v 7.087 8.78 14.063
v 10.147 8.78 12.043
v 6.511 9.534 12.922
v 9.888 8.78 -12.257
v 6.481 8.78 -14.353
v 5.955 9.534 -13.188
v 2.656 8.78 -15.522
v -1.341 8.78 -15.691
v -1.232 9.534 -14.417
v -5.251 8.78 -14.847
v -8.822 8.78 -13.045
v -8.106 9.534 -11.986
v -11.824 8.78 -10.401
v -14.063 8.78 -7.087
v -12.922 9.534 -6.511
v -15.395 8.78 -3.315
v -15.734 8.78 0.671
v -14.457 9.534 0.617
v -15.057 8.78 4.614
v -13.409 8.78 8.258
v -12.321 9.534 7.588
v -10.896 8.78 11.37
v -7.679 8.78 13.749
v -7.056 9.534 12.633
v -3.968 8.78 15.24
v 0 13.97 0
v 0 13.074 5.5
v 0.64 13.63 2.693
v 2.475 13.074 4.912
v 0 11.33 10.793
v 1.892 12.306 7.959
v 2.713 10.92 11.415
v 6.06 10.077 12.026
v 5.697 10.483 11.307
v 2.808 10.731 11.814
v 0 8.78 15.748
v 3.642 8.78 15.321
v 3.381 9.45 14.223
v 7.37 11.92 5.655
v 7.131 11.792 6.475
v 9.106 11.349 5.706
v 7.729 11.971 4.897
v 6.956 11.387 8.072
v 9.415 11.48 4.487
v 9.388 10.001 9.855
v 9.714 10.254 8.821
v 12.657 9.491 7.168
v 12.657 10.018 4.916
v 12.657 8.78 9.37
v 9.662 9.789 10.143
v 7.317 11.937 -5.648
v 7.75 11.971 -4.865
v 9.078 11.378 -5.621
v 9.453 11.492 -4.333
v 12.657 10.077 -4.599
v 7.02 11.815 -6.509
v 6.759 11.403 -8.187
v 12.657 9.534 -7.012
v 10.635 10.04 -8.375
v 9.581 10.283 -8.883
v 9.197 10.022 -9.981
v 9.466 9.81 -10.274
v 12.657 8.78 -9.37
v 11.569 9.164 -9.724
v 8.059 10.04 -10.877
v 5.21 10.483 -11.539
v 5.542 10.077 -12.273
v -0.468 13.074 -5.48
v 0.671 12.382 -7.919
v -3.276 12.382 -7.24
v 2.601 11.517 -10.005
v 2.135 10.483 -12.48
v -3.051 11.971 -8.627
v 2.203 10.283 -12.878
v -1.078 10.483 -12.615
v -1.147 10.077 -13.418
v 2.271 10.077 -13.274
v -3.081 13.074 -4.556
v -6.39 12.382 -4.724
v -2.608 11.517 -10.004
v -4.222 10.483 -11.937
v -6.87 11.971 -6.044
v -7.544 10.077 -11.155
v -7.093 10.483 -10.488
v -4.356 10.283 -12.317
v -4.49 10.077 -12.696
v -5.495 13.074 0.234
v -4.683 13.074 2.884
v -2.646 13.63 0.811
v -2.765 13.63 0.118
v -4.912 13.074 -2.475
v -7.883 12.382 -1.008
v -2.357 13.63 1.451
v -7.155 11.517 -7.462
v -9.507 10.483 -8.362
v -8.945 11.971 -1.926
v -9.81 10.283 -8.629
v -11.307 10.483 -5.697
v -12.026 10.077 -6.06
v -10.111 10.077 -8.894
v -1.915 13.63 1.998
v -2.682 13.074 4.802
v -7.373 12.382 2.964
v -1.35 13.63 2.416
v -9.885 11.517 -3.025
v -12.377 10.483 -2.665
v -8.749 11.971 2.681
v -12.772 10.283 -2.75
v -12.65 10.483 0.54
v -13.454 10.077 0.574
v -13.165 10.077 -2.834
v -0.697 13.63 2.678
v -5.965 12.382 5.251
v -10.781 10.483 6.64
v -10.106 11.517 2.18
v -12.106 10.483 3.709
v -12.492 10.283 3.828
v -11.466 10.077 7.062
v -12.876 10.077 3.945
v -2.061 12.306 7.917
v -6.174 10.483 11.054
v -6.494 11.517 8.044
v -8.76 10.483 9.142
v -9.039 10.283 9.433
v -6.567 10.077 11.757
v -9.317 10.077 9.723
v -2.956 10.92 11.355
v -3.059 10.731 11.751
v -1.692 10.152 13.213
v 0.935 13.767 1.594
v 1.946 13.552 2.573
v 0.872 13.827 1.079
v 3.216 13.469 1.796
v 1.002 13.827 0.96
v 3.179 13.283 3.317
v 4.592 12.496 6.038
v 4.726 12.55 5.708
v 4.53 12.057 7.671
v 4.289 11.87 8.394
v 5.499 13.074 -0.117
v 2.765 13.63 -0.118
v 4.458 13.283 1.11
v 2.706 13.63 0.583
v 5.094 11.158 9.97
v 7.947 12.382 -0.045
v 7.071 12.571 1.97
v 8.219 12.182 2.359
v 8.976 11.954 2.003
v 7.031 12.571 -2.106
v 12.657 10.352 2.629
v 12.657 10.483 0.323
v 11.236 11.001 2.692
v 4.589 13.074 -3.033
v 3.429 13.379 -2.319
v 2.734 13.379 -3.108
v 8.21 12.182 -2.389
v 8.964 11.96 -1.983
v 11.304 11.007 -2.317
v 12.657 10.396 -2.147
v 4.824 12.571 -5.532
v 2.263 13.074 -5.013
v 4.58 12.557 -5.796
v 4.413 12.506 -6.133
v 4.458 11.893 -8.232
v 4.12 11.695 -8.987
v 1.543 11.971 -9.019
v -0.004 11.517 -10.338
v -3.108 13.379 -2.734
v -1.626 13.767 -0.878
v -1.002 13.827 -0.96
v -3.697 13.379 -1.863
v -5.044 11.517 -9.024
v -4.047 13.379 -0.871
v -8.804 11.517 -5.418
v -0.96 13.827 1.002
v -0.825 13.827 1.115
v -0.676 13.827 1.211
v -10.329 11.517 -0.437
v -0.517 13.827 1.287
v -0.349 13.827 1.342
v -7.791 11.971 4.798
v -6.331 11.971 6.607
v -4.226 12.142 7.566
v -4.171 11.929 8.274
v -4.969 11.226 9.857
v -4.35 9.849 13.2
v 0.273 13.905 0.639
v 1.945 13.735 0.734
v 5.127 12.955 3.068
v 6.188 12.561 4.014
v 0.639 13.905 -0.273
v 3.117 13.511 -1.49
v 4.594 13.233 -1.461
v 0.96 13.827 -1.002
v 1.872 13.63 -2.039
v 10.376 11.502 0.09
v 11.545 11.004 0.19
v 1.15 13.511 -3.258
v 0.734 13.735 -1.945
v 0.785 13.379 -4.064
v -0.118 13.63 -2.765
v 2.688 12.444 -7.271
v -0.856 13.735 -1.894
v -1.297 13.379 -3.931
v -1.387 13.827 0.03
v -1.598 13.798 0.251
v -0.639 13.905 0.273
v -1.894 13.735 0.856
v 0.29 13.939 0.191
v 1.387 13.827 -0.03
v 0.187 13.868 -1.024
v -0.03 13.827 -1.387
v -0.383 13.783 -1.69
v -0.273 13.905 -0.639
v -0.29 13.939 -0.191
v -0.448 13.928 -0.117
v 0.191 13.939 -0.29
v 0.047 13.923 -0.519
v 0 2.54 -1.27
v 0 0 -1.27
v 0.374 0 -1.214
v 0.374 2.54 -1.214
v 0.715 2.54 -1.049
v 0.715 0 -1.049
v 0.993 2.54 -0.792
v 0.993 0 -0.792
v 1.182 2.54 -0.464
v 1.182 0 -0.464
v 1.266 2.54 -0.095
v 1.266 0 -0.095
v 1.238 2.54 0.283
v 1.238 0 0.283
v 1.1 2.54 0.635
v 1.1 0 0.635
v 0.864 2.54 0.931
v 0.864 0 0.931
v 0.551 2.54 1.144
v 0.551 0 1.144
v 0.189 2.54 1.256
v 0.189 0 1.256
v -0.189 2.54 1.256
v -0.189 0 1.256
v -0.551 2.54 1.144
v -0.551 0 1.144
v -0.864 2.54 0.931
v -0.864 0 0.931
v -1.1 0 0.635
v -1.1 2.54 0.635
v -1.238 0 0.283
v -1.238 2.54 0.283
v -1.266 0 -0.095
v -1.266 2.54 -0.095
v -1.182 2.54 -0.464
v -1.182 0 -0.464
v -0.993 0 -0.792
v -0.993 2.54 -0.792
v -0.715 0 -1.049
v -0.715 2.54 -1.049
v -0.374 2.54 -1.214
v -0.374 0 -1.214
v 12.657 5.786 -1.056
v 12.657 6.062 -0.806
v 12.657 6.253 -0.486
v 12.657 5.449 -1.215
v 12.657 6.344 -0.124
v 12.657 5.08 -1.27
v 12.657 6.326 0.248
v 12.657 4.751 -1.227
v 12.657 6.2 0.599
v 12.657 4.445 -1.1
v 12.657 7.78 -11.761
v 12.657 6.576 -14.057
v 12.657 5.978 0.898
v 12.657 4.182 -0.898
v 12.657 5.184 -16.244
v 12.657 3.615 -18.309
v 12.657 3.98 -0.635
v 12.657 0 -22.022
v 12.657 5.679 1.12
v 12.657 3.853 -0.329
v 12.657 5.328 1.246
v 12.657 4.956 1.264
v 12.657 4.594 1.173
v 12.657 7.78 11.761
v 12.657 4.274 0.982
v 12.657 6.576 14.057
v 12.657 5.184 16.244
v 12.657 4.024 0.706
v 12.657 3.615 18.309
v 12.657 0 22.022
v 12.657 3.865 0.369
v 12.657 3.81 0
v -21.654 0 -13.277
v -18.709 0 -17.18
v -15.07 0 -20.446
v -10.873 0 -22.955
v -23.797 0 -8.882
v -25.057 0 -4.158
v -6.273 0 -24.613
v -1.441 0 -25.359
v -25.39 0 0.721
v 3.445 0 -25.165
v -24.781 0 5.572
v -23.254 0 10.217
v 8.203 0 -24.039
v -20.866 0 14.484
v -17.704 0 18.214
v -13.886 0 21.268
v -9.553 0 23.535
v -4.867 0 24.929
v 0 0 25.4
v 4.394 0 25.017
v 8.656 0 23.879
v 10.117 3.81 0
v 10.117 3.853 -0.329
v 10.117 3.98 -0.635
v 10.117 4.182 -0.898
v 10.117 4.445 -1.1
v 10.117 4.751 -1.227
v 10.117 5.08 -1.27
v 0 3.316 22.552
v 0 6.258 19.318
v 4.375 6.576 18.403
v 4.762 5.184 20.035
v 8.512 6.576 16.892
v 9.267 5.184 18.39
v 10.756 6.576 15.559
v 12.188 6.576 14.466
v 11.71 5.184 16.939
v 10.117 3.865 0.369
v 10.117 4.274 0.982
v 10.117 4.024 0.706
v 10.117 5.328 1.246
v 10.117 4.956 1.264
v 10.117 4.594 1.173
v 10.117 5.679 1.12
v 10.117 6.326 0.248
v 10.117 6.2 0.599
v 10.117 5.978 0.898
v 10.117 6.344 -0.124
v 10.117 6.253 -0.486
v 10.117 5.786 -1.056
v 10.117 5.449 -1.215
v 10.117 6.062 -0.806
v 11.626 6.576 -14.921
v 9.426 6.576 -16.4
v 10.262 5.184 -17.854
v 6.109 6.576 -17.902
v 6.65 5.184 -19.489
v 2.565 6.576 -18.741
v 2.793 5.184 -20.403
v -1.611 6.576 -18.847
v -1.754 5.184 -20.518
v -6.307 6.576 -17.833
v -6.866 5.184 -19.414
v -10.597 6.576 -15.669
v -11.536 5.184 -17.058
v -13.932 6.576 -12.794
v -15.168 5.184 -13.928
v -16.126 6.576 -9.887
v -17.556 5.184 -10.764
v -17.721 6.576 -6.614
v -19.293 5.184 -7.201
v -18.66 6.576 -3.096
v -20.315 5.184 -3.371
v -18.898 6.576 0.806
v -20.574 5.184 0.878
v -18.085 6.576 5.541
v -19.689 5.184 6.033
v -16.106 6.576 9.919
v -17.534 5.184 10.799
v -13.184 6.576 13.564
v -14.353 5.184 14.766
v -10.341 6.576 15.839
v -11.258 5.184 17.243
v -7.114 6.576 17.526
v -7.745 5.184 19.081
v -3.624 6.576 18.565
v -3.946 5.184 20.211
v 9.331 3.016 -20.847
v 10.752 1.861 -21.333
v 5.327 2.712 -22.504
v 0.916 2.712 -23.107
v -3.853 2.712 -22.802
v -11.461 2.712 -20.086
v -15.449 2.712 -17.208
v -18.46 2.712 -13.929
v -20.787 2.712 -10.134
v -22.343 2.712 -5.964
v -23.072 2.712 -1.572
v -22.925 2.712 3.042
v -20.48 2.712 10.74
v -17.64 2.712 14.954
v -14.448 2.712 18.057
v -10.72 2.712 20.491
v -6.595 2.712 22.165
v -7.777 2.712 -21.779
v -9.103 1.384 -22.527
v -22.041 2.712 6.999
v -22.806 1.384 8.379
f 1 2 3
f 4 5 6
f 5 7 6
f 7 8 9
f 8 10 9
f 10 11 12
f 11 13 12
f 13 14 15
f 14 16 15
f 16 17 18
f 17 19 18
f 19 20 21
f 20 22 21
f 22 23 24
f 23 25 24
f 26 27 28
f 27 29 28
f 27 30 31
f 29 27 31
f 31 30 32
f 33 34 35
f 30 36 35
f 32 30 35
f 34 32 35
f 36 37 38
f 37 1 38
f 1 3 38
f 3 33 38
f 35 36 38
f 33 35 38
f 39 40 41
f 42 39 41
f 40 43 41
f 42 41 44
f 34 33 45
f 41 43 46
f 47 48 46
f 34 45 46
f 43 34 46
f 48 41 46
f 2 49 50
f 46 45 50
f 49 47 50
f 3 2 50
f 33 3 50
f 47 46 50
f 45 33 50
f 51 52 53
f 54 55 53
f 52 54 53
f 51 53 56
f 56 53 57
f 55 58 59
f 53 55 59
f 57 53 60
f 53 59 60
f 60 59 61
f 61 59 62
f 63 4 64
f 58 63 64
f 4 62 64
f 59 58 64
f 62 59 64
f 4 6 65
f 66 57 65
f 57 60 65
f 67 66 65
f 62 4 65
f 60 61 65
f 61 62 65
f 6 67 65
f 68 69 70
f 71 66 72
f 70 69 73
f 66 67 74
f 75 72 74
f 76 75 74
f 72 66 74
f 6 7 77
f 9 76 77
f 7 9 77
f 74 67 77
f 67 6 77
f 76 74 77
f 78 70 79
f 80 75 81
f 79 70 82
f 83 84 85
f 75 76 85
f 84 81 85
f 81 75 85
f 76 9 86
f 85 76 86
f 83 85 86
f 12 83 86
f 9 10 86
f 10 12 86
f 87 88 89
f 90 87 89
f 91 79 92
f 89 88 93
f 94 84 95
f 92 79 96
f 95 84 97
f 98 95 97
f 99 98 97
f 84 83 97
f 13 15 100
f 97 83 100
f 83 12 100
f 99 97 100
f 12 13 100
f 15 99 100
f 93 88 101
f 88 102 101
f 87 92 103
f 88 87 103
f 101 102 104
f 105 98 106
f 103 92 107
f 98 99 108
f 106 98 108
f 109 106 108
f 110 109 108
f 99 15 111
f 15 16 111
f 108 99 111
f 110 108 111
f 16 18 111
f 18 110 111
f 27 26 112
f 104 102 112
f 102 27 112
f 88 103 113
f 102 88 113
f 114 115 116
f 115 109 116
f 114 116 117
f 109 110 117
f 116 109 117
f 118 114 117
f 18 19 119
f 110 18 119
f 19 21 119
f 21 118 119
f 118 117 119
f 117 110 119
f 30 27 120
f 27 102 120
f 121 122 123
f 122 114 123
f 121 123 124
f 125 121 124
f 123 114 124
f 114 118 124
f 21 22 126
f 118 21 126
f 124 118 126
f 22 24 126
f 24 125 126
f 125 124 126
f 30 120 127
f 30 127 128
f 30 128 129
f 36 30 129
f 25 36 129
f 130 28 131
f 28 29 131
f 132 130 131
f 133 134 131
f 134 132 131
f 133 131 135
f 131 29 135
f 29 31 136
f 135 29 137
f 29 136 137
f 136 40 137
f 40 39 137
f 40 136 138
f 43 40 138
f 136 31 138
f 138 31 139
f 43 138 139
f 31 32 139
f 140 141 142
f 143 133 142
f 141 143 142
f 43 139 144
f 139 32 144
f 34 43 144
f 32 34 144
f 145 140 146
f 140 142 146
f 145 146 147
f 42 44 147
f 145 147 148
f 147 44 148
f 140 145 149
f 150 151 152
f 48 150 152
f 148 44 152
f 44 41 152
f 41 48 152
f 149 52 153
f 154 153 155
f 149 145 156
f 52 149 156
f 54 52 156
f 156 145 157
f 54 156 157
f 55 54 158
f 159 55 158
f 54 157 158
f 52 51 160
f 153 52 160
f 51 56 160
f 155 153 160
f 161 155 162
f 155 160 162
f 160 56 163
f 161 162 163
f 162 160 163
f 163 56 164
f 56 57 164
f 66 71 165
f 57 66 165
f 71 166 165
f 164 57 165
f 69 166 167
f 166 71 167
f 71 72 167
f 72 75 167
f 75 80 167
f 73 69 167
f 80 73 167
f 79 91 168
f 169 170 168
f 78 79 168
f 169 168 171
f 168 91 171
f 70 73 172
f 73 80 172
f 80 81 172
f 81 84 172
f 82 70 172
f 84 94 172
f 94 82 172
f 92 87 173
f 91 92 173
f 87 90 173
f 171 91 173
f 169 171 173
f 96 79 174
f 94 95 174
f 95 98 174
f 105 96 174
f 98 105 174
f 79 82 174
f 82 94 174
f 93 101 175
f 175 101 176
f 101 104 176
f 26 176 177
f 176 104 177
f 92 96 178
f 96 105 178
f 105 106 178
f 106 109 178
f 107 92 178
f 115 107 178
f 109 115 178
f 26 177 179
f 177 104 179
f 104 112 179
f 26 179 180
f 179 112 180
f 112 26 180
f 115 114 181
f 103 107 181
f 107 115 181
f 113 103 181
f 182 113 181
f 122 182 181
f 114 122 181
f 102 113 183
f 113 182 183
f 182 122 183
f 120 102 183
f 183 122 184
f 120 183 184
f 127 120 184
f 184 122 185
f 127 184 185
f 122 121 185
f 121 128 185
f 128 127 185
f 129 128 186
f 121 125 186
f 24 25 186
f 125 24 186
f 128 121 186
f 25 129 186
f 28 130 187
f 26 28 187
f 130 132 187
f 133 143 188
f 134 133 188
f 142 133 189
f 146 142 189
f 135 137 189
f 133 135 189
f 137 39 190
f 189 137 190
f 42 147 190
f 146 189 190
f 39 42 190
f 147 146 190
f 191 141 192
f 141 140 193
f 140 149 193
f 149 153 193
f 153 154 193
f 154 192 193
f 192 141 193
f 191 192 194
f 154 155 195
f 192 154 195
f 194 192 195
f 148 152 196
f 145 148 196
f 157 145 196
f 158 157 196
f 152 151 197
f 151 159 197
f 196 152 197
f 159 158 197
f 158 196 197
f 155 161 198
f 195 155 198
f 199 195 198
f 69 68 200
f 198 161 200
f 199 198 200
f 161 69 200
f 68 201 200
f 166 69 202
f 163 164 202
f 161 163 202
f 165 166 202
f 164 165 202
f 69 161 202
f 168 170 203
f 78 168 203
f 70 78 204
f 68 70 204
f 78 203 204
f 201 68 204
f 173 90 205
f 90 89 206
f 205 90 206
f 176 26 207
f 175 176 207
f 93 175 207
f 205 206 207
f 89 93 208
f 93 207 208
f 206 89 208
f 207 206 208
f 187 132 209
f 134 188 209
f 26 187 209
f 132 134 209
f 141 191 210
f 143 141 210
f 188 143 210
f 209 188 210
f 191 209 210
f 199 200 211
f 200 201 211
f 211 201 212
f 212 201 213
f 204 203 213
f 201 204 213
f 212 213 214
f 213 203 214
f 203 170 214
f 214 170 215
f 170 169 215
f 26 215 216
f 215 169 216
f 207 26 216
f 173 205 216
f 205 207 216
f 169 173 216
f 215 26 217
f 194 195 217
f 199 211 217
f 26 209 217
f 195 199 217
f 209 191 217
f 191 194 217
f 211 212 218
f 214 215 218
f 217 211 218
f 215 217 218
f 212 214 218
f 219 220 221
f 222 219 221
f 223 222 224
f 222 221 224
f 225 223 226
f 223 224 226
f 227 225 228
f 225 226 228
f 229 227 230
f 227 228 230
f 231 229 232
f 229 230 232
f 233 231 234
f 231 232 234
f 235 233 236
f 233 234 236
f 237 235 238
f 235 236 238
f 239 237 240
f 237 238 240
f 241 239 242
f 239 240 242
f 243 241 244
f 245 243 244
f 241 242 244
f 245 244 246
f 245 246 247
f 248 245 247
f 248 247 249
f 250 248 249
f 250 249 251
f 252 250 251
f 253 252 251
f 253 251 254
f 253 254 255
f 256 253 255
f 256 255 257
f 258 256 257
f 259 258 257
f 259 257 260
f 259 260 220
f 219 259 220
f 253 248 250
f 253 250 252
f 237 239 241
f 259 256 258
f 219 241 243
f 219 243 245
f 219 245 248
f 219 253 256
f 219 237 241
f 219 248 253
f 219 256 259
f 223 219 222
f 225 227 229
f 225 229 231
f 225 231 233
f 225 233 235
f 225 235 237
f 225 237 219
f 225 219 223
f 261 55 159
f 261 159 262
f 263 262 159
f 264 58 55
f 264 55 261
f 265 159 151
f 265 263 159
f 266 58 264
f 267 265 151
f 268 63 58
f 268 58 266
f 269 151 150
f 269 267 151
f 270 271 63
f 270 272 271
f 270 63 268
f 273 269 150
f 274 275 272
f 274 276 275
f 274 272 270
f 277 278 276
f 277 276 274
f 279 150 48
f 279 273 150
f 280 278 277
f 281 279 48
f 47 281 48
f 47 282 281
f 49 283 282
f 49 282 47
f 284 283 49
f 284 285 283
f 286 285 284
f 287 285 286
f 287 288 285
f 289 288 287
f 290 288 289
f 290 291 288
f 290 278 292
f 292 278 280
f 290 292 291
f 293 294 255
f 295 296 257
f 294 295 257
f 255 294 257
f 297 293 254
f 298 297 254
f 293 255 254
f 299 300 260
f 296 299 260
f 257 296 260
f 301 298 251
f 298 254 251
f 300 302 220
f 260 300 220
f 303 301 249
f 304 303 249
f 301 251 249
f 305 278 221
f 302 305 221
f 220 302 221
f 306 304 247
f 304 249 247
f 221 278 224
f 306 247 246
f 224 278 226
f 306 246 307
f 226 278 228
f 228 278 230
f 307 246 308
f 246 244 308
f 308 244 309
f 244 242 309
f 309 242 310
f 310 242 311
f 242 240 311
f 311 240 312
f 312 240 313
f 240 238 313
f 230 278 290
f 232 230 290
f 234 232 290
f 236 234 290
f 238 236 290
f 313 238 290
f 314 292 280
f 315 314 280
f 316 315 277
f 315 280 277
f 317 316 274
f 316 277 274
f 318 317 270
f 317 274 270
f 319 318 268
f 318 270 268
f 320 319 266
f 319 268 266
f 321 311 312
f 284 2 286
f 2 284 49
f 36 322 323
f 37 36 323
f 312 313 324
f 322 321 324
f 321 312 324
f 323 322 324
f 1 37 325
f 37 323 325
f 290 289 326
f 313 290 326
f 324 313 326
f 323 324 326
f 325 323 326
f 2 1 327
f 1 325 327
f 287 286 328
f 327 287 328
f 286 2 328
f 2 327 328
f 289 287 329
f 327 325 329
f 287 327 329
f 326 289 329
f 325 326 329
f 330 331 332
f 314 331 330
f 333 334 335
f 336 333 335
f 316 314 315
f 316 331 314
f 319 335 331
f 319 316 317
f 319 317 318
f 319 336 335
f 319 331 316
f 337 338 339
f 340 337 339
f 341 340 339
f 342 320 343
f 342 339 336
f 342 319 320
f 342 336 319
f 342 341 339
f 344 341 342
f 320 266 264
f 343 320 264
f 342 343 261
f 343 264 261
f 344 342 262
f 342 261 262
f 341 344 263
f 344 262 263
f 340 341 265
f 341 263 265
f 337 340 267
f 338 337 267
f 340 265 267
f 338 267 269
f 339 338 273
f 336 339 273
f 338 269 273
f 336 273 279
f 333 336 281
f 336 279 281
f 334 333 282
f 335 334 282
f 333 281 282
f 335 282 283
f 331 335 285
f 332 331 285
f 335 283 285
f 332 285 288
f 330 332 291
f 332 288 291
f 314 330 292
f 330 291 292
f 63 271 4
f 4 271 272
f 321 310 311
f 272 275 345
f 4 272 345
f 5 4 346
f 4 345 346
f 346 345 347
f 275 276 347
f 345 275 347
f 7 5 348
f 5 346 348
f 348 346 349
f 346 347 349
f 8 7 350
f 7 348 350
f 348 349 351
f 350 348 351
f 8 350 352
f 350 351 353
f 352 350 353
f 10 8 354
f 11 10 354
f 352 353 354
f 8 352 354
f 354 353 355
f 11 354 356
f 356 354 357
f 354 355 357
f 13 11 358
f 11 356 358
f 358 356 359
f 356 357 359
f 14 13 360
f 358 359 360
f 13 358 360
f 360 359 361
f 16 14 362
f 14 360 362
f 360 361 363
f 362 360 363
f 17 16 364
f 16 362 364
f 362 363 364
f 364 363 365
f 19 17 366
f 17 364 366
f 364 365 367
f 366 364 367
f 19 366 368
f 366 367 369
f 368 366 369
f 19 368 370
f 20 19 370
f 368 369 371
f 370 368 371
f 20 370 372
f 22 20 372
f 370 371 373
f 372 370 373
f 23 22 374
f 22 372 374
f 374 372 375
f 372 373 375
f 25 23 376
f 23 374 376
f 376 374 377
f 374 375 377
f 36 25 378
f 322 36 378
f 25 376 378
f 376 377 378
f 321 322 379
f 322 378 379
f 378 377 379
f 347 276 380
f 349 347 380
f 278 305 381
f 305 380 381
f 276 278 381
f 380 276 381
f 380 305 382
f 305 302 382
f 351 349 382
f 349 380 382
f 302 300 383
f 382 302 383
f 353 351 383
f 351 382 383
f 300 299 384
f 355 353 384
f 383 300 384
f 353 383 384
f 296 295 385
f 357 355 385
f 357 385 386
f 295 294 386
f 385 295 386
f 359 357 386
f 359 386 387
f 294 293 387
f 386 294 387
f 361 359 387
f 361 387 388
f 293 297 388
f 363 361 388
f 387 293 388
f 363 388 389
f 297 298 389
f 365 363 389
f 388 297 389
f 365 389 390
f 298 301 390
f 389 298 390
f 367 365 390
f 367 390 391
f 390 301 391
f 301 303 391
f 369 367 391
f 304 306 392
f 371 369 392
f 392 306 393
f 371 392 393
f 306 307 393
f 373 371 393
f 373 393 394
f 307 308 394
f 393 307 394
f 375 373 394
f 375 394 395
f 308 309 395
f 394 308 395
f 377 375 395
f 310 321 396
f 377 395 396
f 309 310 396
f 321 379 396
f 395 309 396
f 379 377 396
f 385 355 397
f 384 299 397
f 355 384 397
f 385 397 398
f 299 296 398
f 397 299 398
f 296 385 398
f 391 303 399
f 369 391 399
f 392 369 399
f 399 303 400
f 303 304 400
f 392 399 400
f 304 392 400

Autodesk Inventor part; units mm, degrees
ref_plane "YZ Plane" through (0, 0, 0) normal (1, 0, 0) x (0, 1, 0)
ref_plane "XZ Plane" through (0, 0, 0) normal (0, 1, 0) x (-1, 0, 0)
ref_plane "XY Plane" through (0, 0, 0) normal (0, 0, 1) x (1, 0, 0)
sketch "Sketch1" plane through (0, 0, 0) normal (1, 0, 0) x (0, 1, 0)
  line L0 (0, 0) -> (0, 25.4)
  line L1 (0, 0) -> (13.97, 0)
  arc A0 (13.97, 0) -> (0, 25.4) centre (-21.4675, -2.9489) ccw
  line L2 (0, 0) -> (0, 15.748)
  line L3 (0, 15.748) -> (8.7805, 15.748)
  dimension "d0" = 25.4
  dimension "d1" = 13.97
  dimension "d2" = 35.56
  dimension "d3" = 15.748
revolve "Revolution1" add sketch "Sketch1" angle 360 about axis through (0, 0, 0) along (0, 1, 0)
sketch "Sketch6" plane through (0, 0, 0) normal (0, -1, 0) x (0, 0, -1)
  circle A0 centre (0, 0) radius 1.27
  dimension "d19" = 2.54
extrude "Extrusion5" cut sketch "Sketch6" against normal blind 2.54
sketch "Sketch7" plane through (0, 0, 0) normal (0, -1, 0) x (0, 0, -1)
  point P0 (0, 0)
sketch "Sketch8" plane through (0, 0, 0) normal (0, -1, 0) x (1, 0, 0)
  circle A0 centre (0, 0) radius 1.27 projected
  line L0 (0, 0) -> (12.657, 0)
  line L1 (12.657, 0) -> (12.657, 22.0218)
  circle A1 centre (0, 0) radius 25.4 projected
  line L2 (12.657, 22.0218) -> (27.5297, 22.0218)
  line L3 (27.5297, 22.0218) -> (27.5297, -29.4448)
  line L4 (27.5297, -29.4448) -> (12.657, -29.4448)
  line L5 (12.657, -29.4448) -> (12.657, 22.0218)
  dimension "d22" = 22.0218
extrude "Extrusion6" cut sketch "Sketch8" against normal blind 25.4 contours L1 A1 L5 | L2 L3 L4 L5 A1 picked at (14.0935, 13.6414)
sketch "Sketch9" plane through (12.657, 0, 22.0218) normal (1, 0, 0) x (0, 0, -1)
  line L0 (22.0218, 0) -> (22.0218, 5.08)
  circle A0 centre (22.0218, 5.08) radius 1.27
  dimension "d25" = 5.08
  dimension "d26" = 2.54
extrude "Extrusion7" cut sketch "Sketch9" against normal blind 2.54
properties part number "camera side 2" material "UHMW, White"
